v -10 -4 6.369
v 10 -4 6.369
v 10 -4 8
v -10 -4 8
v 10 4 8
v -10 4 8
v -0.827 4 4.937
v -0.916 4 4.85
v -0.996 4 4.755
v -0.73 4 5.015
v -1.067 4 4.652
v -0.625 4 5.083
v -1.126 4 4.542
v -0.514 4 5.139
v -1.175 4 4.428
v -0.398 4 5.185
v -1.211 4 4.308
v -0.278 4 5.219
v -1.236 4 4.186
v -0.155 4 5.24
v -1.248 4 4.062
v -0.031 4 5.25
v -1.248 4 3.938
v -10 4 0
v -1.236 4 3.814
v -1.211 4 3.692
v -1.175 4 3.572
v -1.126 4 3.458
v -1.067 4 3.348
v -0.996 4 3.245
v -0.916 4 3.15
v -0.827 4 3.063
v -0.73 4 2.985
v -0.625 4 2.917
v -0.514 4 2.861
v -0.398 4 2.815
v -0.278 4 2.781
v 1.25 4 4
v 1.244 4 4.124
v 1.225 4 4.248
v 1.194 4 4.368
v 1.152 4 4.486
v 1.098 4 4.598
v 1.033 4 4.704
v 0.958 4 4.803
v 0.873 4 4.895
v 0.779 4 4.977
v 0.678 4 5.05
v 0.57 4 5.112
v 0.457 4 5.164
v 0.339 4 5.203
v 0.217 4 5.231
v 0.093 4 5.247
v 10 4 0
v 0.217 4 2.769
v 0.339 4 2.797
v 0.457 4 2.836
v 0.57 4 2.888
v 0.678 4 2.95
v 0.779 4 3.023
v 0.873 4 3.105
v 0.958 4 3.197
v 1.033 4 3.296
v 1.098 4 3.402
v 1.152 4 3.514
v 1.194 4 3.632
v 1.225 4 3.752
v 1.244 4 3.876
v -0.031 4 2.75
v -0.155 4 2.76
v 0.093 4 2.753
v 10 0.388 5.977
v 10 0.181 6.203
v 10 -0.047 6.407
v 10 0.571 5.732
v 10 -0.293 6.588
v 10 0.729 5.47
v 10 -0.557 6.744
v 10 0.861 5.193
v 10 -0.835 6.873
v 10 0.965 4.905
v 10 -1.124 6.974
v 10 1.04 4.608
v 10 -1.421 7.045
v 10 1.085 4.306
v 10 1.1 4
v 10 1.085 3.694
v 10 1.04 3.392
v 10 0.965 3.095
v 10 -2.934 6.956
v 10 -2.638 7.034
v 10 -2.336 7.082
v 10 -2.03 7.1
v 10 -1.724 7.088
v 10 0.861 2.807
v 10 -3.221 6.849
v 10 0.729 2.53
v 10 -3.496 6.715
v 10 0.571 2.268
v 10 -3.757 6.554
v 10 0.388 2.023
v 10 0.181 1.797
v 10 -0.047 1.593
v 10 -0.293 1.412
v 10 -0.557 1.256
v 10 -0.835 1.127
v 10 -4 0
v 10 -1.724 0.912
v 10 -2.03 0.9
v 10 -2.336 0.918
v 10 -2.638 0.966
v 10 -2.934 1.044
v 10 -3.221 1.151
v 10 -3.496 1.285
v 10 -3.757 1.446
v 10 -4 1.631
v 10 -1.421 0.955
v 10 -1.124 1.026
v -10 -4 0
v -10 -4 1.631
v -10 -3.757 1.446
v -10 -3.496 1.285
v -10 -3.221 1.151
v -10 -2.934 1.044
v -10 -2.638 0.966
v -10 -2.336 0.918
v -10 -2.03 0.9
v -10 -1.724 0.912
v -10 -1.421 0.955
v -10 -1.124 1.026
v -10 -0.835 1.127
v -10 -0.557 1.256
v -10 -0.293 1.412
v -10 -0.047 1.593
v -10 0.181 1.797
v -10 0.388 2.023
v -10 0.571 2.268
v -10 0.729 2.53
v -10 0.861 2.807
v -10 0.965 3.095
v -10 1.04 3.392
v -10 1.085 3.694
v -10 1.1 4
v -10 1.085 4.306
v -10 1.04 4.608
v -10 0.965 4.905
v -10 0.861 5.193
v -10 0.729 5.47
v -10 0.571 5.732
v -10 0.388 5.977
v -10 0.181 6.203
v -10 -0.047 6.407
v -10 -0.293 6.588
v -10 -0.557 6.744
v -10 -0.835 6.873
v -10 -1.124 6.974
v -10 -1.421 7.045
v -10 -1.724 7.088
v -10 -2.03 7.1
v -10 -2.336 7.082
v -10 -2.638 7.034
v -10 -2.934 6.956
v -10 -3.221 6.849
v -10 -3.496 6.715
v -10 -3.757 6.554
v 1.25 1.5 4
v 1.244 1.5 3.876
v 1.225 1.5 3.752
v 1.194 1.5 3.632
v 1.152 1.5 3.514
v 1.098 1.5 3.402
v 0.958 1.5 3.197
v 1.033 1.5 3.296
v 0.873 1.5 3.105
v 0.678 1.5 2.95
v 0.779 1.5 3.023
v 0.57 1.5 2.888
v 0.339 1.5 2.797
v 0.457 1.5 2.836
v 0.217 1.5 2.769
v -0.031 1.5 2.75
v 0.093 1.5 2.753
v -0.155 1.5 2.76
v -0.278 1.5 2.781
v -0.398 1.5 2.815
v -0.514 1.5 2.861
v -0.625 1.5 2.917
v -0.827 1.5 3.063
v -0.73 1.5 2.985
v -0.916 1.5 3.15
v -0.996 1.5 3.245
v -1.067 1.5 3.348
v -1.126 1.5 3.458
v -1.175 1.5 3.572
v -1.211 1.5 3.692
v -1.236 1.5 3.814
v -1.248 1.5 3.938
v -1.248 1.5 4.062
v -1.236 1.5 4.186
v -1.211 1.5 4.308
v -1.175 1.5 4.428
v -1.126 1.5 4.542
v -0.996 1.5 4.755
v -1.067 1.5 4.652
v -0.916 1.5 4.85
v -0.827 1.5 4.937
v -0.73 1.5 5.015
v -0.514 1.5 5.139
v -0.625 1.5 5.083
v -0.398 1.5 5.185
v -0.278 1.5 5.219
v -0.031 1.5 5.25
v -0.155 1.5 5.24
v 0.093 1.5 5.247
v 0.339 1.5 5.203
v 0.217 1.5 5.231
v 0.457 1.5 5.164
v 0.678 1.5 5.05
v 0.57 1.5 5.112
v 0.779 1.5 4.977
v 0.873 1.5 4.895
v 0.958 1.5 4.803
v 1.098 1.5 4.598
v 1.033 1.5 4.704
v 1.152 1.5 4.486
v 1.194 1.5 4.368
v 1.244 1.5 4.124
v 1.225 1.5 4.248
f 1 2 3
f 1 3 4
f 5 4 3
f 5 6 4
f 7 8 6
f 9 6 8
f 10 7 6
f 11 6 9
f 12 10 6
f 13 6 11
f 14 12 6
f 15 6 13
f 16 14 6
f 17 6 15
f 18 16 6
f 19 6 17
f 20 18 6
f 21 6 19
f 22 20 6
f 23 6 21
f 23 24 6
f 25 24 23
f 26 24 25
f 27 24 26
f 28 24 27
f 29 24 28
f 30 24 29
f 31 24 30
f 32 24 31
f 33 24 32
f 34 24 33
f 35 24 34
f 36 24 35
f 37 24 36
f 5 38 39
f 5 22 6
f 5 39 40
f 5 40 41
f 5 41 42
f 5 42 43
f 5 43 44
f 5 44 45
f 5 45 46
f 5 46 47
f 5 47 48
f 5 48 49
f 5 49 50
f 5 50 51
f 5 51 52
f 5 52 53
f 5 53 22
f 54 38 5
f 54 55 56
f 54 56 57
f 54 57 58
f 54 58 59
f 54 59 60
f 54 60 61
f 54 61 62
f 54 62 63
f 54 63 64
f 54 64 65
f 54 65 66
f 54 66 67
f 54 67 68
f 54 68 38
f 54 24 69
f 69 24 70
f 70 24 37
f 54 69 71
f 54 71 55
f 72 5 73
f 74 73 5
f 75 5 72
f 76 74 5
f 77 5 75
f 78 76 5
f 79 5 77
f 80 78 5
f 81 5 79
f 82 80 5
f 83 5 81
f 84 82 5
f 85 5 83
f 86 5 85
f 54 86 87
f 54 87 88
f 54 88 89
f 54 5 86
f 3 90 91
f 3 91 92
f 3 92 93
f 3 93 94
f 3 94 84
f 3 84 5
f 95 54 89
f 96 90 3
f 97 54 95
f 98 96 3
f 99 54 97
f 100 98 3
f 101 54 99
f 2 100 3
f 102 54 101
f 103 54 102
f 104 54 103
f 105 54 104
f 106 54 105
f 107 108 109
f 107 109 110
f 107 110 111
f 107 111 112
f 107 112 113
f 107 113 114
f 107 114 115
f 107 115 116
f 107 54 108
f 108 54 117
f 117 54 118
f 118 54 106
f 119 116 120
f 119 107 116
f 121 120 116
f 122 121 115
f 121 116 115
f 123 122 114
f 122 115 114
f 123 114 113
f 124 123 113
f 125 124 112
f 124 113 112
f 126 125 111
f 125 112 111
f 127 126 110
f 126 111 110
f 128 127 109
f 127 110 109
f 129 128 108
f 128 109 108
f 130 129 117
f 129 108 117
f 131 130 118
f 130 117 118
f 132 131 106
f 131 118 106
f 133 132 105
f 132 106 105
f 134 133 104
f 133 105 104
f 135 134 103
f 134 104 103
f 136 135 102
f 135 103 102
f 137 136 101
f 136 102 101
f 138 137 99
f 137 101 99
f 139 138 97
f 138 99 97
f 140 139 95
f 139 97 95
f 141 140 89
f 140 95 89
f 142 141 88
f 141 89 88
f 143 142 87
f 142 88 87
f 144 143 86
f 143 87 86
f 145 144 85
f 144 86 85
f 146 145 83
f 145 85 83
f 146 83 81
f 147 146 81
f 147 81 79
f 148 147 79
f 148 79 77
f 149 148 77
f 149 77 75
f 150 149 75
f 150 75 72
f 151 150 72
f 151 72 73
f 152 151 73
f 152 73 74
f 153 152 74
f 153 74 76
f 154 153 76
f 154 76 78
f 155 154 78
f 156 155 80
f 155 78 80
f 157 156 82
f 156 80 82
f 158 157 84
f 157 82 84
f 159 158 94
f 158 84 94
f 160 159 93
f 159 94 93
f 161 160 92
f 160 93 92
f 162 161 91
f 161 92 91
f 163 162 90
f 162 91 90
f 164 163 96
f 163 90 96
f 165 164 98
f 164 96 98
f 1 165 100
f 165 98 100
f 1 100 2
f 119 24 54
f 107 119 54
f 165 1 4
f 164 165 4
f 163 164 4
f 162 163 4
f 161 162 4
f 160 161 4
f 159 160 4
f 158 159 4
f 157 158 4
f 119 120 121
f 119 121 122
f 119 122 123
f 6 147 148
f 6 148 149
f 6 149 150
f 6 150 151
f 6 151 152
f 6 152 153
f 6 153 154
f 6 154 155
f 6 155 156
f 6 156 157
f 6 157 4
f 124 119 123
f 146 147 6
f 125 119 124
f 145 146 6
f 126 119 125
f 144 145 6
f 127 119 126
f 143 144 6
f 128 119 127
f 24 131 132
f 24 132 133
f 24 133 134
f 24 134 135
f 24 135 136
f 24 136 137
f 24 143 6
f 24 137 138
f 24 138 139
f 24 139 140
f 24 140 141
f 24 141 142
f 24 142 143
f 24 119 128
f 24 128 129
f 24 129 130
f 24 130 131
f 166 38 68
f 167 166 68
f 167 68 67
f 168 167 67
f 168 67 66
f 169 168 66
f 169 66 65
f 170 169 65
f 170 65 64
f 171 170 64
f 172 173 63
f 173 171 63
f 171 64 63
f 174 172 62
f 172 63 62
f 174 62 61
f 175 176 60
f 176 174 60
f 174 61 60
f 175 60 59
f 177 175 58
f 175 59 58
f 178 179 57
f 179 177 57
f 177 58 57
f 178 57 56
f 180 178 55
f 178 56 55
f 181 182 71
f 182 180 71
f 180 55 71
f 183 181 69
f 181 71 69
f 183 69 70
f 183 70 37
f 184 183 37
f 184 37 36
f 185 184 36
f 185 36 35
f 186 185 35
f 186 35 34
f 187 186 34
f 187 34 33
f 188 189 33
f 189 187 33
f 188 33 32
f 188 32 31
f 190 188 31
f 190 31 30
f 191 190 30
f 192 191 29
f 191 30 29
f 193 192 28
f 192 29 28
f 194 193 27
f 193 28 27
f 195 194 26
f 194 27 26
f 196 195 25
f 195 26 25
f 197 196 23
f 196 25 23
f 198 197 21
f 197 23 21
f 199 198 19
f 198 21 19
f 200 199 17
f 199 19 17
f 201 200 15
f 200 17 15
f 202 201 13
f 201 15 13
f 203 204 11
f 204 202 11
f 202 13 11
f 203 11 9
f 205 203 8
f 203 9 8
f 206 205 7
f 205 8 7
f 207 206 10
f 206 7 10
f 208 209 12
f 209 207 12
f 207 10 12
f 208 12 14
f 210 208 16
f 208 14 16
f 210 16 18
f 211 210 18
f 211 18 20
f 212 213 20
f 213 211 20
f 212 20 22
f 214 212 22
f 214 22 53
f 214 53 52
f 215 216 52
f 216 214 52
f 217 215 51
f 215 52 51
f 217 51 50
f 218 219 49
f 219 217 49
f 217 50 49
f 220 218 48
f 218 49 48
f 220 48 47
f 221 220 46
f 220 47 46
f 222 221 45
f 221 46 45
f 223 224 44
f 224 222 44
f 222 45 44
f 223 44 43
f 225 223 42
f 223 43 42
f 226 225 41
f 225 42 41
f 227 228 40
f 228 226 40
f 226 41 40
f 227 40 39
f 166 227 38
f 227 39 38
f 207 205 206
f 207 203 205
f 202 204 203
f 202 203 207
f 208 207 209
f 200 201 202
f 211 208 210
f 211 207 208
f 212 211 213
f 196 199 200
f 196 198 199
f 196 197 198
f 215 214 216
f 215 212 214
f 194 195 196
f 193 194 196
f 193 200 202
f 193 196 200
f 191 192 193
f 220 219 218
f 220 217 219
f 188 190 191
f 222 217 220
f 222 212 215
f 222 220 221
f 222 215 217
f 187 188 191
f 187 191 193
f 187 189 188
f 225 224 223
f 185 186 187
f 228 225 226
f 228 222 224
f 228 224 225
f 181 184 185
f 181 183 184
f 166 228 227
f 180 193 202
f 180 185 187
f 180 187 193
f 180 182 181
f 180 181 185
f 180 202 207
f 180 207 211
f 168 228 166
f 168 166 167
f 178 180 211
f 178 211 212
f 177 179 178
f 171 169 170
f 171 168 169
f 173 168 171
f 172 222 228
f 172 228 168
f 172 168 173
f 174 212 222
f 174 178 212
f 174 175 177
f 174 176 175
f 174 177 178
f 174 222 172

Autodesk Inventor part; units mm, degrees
ref_plane "YZ Plane" through (0, 0, 0) normal (1, 0, 0) x (0, 1, 0)
ref_plane "XZ Plane" through (0, 0, 0) normal (0, 1, 0) x (-1, 0, 0)
ref_plane "XY Plane" through (0, 0, 0) normal (0, 0, 1) x (1, 0, 0)
sketch "Sketch1" plane through (0, 0, 0) normal (0, 0, 1) x (1, 0, 0)
  line L0 (-10, 4) -> (10, 4)
  line L1 (10, 4) -> (10, -4)
  line L2 (10, -4) -> (-10, -4)
  line L3 (-10, -4) -> (-10, 4)
  line L4 (-10, 4) -> (10, -4) construction
  line L5 (10, 4) -> (-10, -4) construction
  point P0 (0, 0)
  dimension "d0" = 20
  dimension "d1" = 8
extrude "Extrusion1" add sketch "Sketch1" along normal blind 8
sketch "Sketch2" plane through (10, -4, 0) normal (1, 0, 0) x (0, 0, -1)
  line L0 (0, 0) -> (-8, 0) projected
  line L1 (-4, 0) -> (-4, 2)
  circle A0 centre (-4, 2) radius 3.1
  point P0 (0, 4)
  point P1 (-1.6315, 0)
  point P2 (-6.3685, 0)
  dimension "d4" = 2
  dimension "d5" = 6.2
extrude "Extrusion2" cut sketch "Sketch2" against normal blind 20 contours L0 A0 picked at (-3.9802, 3.385)
sketch "Sketch3" plane through (-10, 4, 0) normal (0, 1, 0) x (1, 0, 0)
  line L0 (0, 0) -> (0, -8) projected
  line L1 (0, -4) -> (10, -4)
  circle A0 centre (10, -4) radius 1.25
  point P0 (10, 0)
  dimension "d8" = 2.5
extrude "Extrusion3" cut sketch "Sketch3" against normal blind 2.5
properties part number "magnet dims"
